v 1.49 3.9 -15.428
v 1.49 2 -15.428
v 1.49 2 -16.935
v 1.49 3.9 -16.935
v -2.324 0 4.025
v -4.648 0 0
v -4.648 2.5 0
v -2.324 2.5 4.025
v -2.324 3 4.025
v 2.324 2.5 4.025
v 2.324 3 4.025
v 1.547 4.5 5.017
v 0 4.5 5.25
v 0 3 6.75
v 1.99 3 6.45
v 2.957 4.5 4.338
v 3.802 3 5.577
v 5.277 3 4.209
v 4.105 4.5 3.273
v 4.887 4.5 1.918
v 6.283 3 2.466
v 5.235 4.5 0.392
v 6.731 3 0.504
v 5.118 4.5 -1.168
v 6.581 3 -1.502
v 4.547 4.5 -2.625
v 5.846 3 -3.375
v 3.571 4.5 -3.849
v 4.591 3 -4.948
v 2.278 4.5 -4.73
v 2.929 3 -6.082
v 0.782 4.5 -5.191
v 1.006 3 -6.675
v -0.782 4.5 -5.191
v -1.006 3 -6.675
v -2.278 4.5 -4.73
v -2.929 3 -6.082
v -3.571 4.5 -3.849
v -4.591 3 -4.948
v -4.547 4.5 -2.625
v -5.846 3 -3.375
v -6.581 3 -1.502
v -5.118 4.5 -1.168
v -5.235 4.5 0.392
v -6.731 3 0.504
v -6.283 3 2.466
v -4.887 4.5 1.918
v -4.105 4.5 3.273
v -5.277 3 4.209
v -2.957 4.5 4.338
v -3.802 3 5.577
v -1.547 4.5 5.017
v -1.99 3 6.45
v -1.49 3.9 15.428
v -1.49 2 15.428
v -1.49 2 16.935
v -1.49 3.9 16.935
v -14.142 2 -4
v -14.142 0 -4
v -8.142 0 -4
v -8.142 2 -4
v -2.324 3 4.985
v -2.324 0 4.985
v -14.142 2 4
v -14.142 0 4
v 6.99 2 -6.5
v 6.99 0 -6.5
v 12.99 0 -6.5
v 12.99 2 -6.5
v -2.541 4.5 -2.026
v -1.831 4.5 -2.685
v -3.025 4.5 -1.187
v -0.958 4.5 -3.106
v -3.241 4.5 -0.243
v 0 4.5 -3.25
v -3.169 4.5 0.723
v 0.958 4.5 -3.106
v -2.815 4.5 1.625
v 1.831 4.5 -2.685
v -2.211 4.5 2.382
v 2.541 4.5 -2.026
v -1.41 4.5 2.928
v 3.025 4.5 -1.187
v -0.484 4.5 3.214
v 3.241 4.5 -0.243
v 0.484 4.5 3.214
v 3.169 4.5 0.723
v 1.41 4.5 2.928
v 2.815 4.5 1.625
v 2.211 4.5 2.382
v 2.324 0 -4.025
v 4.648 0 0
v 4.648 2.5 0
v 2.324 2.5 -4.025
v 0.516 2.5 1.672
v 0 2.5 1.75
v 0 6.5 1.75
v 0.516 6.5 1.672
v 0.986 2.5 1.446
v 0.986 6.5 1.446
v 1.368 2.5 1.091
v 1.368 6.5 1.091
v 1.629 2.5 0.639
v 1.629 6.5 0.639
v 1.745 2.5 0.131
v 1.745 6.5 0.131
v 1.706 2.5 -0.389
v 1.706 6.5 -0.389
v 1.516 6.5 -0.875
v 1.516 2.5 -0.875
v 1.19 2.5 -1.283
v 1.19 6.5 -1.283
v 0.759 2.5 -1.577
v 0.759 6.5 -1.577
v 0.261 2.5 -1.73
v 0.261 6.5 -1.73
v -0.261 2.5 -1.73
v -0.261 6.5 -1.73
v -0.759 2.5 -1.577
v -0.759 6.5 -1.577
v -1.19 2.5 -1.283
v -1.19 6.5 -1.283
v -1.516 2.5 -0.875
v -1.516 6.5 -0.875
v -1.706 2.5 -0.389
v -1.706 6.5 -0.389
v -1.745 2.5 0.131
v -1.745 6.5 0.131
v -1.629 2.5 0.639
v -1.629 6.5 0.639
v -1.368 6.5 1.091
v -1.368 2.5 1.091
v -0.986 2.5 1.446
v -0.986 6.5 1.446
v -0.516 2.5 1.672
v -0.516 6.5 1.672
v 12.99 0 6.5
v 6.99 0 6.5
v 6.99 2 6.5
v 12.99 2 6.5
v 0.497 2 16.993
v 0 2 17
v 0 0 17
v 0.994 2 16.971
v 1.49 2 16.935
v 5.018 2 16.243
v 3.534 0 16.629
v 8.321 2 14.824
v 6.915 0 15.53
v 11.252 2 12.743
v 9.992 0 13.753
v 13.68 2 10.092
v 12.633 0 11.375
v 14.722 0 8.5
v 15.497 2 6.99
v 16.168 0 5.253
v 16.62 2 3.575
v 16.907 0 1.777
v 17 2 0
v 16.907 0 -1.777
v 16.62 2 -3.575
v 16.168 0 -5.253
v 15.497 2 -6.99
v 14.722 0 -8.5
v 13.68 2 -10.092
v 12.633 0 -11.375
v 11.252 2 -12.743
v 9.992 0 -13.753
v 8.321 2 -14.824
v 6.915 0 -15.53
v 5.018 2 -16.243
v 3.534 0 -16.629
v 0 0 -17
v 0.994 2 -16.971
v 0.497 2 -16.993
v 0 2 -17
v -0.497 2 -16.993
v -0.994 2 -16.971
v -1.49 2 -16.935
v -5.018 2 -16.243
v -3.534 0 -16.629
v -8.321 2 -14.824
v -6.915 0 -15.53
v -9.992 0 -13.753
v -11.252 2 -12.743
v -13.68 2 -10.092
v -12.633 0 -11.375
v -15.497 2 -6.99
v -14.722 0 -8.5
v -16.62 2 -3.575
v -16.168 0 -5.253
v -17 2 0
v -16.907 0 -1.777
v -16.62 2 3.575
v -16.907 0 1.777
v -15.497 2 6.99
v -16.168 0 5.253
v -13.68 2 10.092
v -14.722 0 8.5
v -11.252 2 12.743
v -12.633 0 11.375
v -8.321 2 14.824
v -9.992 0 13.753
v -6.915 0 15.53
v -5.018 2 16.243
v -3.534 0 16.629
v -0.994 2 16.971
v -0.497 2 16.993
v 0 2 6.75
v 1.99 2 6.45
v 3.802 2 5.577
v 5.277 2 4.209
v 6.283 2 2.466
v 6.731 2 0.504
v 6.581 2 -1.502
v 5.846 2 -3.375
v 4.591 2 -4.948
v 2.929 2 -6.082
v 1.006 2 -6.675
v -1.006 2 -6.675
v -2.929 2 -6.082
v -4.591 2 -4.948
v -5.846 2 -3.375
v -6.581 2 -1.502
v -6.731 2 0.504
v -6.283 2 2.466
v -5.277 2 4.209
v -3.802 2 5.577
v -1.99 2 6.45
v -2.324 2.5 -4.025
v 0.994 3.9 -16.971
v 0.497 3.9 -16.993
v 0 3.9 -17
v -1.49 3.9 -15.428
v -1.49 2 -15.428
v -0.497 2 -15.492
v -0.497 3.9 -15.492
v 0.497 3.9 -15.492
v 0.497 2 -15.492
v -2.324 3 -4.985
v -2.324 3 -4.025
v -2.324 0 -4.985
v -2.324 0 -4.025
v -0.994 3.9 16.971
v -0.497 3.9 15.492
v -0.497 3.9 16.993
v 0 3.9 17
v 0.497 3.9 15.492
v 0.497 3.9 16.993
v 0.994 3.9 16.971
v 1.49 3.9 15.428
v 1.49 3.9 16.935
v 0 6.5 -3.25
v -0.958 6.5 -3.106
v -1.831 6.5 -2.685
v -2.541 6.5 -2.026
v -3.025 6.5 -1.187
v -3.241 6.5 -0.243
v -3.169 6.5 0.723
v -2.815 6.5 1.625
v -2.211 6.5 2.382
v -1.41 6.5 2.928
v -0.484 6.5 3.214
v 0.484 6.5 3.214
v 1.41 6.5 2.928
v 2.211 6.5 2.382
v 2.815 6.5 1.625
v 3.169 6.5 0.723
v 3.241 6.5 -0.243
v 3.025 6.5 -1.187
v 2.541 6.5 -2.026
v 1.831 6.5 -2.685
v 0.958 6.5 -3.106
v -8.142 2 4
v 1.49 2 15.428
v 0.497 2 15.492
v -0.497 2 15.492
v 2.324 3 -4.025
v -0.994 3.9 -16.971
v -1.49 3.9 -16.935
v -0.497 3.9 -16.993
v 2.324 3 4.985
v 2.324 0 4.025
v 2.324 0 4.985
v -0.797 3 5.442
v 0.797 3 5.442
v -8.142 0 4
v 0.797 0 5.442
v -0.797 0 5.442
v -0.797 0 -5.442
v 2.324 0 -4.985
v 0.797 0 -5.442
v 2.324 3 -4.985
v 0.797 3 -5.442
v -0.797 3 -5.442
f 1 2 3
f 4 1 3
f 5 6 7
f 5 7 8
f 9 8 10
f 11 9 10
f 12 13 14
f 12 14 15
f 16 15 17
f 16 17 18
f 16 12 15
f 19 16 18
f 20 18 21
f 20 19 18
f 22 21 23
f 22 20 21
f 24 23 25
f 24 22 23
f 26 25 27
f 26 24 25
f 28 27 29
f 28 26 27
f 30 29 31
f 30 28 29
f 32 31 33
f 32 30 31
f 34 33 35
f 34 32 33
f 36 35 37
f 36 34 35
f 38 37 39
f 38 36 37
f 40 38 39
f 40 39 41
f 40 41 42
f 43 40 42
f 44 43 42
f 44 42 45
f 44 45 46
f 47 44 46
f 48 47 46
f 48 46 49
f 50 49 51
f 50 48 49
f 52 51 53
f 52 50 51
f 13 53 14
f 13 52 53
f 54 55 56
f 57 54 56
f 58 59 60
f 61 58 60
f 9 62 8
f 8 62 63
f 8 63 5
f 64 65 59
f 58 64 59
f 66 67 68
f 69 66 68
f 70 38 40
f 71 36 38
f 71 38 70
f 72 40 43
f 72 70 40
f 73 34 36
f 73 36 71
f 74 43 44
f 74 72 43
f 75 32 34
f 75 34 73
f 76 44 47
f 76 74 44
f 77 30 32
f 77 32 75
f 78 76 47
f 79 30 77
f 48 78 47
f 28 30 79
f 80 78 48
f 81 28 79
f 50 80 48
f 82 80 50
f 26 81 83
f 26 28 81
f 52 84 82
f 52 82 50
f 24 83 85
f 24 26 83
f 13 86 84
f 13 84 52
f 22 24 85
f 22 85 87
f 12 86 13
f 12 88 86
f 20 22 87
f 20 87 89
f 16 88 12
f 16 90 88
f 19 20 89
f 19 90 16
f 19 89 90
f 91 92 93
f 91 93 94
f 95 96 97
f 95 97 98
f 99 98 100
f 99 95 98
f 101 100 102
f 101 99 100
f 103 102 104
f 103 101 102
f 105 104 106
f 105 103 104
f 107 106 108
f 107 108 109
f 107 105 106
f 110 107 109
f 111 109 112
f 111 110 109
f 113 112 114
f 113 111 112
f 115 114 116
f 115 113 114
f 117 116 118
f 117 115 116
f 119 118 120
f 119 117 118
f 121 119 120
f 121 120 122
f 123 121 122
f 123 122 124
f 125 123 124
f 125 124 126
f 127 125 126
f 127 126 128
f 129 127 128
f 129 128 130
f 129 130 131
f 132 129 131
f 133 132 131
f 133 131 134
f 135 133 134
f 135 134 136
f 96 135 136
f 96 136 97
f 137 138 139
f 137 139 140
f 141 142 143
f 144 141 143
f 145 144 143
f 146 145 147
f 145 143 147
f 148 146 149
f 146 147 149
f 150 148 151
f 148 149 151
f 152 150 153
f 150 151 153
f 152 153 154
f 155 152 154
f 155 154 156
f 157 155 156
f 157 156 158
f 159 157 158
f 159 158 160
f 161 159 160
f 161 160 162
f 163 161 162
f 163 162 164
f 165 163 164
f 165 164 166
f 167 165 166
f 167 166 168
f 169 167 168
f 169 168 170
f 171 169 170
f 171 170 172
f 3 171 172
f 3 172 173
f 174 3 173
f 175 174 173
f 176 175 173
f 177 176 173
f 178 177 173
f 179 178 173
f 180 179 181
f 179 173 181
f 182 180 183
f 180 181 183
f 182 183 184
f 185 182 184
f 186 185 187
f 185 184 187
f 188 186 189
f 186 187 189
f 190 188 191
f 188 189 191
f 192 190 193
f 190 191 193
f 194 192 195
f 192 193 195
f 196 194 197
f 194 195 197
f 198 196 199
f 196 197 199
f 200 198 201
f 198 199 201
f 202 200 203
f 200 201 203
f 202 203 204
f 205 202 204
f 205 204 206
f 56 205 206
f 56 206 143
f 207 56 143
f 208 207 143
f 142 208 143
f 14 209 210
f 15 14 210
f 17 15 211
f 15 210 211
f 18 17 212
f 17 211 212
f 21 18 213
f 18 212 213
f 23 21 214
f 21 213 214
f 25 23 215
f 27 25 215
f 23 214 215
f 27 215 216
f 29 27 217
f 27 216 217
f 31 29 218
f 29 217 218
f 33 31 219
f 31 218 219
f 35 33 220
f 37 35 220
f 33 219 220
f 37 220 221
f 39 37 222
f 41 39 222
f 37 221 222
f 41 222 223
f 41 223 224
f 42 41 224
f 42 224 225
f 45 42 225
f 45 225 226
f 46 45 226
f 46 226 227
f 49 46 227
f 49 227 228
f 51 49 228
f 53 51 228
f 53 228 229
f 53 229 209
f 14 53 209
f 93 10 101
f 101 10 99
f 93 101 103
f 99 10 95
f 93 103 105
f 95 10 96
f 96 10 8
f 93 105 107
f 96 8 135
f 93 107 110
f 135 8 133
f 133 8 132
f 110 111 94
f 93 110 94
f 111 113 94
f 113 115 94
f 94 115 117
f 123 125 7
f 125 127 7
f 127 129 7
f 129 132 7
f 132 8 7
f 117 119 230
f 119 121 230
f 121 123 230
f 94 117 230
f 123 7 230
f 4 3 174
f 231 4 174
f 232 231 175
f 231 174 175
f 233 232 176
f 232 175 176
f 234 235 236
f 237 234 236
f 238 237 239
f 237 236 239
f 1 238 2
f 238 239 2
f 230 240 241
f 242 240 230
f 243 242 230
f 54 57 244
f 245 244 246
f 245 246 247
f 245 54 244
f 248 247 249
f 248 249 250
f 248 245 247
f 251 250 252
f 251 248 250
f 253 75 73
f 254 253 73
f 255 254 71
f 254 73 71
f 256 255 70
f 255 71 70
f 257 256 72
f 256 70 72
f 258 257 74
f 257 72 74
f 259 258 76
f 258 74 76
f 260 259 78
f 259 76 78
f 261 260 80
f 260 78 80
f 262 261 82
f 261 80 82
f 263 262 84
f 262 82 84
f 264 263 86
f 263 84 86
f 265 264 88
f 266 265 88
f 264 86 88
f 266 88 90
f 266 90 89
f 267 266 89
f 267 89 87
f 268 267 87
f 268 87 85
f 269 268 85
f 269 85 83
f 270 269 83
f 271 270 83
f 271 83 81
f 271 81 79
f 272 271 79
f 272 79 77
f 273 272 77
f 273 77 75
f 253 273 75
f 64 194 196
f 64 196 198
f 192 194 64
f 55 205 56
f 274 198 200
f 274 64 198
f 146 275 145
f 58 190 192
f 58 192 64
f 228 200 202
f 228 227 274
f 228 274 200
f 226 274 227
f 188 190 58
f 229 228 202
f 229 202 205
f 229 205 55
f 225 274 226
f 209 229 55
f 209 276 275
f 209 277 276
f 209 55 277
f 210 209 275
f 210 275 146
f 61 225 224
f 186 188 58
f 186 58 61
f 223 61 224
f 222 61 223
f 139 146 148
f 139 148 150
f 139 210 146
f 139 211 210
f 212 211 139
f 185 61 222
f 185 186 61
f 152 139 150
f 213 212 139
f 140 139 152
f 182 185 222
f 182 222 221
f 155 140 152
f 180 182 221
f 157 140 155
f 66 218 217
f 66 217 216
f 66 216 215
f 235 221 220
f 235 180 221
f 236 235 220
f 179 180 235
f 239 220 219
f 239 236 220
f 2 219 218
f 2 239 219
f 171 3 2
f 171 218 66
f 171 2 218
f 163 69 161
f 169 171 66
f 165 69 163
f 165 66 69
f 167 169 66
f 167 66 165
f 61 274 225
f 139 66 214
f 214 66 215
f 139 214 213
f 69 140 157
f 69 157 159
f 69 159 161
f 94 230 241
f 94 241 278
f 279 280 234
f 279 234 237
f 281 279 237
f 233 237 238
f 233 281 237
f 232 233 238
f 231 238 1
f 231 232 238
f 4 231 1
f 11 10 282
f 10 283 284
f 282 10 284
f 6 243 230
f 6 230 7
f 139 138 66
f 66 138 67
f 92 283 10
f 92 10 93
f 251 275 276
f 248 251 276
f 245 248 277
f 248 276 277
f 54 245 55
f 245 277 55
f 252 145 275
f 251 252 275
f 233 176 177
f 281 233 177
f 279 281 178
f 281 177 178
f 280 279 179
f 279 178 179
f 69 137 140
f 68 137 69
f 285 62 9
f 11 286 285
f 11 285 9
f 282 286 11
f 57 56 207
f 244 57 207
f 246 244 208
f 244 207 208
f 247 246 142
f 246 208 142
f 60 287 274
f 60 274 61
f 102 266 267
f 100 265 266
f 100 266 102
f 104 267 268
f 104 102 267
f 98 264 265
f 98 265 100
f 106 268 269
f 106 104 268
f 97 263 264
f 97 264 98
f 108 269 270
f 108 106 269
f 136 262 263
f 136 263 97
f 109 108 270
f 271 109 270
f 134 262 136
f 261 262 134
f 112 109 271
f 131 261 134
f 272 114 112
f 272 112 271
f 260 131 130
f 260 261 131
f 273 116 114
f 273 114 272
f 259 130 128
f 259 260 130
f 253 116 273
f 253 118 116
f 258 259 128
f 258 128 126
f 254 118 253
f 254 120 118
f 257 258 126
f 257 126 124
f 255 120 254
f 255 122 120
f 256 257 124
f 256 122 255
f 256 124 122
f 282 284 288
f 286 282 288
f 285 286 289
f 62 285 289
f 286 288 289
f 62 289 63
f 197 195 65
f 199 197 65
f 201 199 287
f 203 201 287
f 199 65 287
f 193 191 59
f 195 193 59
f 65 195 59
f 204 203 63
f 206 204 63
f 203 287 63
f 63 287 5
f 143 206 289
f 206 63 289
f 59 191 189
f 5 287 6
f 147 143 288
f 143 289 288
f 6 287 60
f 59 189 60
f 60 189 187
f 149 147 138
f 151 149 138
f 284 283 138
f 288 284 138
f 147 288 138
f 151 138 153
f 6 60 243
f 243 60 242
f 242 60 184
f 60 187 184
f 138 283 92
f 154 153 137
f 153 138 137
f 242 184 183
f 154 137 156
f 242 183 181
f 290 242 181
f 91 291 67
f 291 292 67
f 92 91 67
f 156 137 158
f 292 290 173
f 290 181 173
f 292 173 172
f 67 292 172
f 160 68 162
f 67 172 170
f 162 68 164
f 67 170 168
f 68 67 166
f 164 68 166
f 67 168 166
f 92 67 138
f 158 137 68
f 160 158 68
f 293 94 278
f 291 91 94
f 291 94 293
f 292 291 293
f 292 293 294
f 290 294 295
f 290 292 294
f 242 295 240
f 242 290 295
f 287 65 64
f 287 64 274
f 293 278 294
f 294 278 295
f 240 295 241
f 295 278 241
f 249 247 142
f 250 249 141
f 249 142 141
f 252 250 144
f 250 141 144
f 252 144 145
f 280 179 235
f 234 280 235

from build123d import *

# Parameters (mm, degrees)
SKETCH1_R           = 17
SKETCH1_R_2         = 1.75
SKETCH1_W           = 6
SKETCH1_H           = 13
SKETCH1_H_2         = 8
BOSS_EXTRUDE1_DEPTH = 2
SKETCH1_3_R         = 6.75
SKETCH1_3_R_2       = 1.75
BOSS_EXTRUDE2_DEPTH = 4.5
SKETCH1_4_R         = 3.25
SKETCH1_4_R_2       = 1.75
BOSS_EXTRUDE3_DEPTH = 6.5
SKETCH1_5_R         = 1.75
CUT_EXTRUDE1_DEPTH  = 2.5
BOSS_EXTRUDE4_DEPTH = 1.9
CUT_EXTRUDE2_DEPTH  = 3
CHAMFER1_SIZE       = 1.5


with BuildPart() as part:
    # Sketch1 → Boss-Extrude1 (new body)
    with BuildSketch(Plane(origin=(0, 0, 0), x_dir=(1, 0, 0), z_dir=(0, 1, 0))):
        Circle(SKETCH1_R)
        Circle(SKETCH1_R_2, mode=Mode.SUBTRACT)
        with Locations((9.99, 0)):
            Rectangle(SKETCH1_W, SKETCH1_H, mode=Mode.SUBTRACT)
        with Locations((-11.142, 0)):
            Rectangle(SKETCH1_W, SKETCH1_H_2, mode=Mode.SUBTRACT)
    extrude(amount=BOSS_EXTRUDE1_DEPTH)

    # Sketch1<3> → Boss-Extrude2 (add)
    with BuildSketch(Plane(origin=(0, 0, 0), x_dir=(1, 0, 0), z_dir=(0, 1, 0))):
        Circle(SKETCH1_3_R)
        Circle(SKETCH1_3_R_2, mode=Mode.SUBTRACT)
    extrude(amount=BOSS_EXTRUDE2_DEPTH)

    # Sketch1<4> → Boss-Extrude3 (add)
    with BuildSketch(Plane(origin=(0, 0, 0), x_dir=(1, 0, 0), z_dir=(0, 1, 0))):
        Circle(SKETCH1_4_R)
        Circle(SKETCH1_4_R_2, mode=Mode.SUBTRACT)
    extrude(amount=BOSS_EXTRUDE3_DEPTH)

    # Sketch1<5> → Cut-Extrude1 (cut)
    with BuildSketch(Plane(origin=(0, 0, 0), x_dir=(1, 0, 0), z_dir=(0, 1, 0))):
        Polygon((2.323834833, -4.025), (4.647669667, 0), (2.323834833, 4.025), (-2.323834833, 4.025), (-4.647669667, 0), (-2.323834833, -4.025), align=None)
        Circle(SKETCH1_5_R, mode=Mode.SUBTRACT)
    extrude(amount=CUT_EXTRUDE1_DEPTH, mode=Mode.SUBTRACT)

    # Sketch2 → Boss-Extrude4 (add)
    with BuildSketch(Plane(origin=(0, 2, 0), x_dir=(1, 0, 0), z_dir=(0, 1, 0))):
        with BuildLine():
            ThreePointArc((1.49, 16.934577054), (0, 17), (-1.49, 16.934577054))
            Line((-1.49, 16.934577054), (-1.49, 15.428217655))
            ThreePointArc((-1.49, 15.428217655), (0, 15.5), (1.49, 15.428217655))
            Line((1.49, 15.428217655), (1.49, 16.934577054))
        make_face()
        with BuildLine():
            Line((-1.49, -15.428217655), (-1.49, -16.934577054))
            ThreePointArc((-1.49, -16.934577054), (0, -17), (1.49, -16.934577054))
            Line((1.49, -16.934577054), (1.49, -15.428217655))
            ThreePointArc((1.49, -15.428217655), (0, -15.5), (-1.49, -15.428217655))
        make_face()
    extrude(amount=BOSS_EXTRUDE4_DEPTH)

    # Sketch4 → Cut-Extrude2 (cut)
    with BuildSketch(Plane.XZ):
        with BuildLine():
            Line((-2.323834833, 4.025), (2.323666704, 4.025))
            Line((2.323666704, 4.025), (2.323666704, 4.98503491))
            ThreePointArc((2.323666704, 4.98503491), (-9.275e-05, 5.499999999), (-2.323834833, 4.984956536))
            Line((-2.323834833, 4.984956536), (-2.323834833, 4.025))
        make_face()
        with BuildLine():
            Line((2.323666704, -4.025), (2.323666704, -4.98503491))
            ThreePointArc((2.323666704, -4.98503491), (0, -5.5), (-2.323666704, -4.98503491))
            Line((-2.323666704, -4.98503491), (-2.323834833, -4.025))
            Line((-2.323834833, -4.025), (2.323666704, -4.025))
        make_face()
    extrude(amount=-CUT_EXTRUDE2_DEPTH, mode=Mode.SUBTRACT)

    # Chamfer1
    chamfer1_edges = [part.edges().sort_by_distance(p)[0] for p in [
        (-6.75, 4.5, 0),
    ]]
    chamfer(chamfer1_edges, length=CHAMFER1_SIZE)


solid = part.part
